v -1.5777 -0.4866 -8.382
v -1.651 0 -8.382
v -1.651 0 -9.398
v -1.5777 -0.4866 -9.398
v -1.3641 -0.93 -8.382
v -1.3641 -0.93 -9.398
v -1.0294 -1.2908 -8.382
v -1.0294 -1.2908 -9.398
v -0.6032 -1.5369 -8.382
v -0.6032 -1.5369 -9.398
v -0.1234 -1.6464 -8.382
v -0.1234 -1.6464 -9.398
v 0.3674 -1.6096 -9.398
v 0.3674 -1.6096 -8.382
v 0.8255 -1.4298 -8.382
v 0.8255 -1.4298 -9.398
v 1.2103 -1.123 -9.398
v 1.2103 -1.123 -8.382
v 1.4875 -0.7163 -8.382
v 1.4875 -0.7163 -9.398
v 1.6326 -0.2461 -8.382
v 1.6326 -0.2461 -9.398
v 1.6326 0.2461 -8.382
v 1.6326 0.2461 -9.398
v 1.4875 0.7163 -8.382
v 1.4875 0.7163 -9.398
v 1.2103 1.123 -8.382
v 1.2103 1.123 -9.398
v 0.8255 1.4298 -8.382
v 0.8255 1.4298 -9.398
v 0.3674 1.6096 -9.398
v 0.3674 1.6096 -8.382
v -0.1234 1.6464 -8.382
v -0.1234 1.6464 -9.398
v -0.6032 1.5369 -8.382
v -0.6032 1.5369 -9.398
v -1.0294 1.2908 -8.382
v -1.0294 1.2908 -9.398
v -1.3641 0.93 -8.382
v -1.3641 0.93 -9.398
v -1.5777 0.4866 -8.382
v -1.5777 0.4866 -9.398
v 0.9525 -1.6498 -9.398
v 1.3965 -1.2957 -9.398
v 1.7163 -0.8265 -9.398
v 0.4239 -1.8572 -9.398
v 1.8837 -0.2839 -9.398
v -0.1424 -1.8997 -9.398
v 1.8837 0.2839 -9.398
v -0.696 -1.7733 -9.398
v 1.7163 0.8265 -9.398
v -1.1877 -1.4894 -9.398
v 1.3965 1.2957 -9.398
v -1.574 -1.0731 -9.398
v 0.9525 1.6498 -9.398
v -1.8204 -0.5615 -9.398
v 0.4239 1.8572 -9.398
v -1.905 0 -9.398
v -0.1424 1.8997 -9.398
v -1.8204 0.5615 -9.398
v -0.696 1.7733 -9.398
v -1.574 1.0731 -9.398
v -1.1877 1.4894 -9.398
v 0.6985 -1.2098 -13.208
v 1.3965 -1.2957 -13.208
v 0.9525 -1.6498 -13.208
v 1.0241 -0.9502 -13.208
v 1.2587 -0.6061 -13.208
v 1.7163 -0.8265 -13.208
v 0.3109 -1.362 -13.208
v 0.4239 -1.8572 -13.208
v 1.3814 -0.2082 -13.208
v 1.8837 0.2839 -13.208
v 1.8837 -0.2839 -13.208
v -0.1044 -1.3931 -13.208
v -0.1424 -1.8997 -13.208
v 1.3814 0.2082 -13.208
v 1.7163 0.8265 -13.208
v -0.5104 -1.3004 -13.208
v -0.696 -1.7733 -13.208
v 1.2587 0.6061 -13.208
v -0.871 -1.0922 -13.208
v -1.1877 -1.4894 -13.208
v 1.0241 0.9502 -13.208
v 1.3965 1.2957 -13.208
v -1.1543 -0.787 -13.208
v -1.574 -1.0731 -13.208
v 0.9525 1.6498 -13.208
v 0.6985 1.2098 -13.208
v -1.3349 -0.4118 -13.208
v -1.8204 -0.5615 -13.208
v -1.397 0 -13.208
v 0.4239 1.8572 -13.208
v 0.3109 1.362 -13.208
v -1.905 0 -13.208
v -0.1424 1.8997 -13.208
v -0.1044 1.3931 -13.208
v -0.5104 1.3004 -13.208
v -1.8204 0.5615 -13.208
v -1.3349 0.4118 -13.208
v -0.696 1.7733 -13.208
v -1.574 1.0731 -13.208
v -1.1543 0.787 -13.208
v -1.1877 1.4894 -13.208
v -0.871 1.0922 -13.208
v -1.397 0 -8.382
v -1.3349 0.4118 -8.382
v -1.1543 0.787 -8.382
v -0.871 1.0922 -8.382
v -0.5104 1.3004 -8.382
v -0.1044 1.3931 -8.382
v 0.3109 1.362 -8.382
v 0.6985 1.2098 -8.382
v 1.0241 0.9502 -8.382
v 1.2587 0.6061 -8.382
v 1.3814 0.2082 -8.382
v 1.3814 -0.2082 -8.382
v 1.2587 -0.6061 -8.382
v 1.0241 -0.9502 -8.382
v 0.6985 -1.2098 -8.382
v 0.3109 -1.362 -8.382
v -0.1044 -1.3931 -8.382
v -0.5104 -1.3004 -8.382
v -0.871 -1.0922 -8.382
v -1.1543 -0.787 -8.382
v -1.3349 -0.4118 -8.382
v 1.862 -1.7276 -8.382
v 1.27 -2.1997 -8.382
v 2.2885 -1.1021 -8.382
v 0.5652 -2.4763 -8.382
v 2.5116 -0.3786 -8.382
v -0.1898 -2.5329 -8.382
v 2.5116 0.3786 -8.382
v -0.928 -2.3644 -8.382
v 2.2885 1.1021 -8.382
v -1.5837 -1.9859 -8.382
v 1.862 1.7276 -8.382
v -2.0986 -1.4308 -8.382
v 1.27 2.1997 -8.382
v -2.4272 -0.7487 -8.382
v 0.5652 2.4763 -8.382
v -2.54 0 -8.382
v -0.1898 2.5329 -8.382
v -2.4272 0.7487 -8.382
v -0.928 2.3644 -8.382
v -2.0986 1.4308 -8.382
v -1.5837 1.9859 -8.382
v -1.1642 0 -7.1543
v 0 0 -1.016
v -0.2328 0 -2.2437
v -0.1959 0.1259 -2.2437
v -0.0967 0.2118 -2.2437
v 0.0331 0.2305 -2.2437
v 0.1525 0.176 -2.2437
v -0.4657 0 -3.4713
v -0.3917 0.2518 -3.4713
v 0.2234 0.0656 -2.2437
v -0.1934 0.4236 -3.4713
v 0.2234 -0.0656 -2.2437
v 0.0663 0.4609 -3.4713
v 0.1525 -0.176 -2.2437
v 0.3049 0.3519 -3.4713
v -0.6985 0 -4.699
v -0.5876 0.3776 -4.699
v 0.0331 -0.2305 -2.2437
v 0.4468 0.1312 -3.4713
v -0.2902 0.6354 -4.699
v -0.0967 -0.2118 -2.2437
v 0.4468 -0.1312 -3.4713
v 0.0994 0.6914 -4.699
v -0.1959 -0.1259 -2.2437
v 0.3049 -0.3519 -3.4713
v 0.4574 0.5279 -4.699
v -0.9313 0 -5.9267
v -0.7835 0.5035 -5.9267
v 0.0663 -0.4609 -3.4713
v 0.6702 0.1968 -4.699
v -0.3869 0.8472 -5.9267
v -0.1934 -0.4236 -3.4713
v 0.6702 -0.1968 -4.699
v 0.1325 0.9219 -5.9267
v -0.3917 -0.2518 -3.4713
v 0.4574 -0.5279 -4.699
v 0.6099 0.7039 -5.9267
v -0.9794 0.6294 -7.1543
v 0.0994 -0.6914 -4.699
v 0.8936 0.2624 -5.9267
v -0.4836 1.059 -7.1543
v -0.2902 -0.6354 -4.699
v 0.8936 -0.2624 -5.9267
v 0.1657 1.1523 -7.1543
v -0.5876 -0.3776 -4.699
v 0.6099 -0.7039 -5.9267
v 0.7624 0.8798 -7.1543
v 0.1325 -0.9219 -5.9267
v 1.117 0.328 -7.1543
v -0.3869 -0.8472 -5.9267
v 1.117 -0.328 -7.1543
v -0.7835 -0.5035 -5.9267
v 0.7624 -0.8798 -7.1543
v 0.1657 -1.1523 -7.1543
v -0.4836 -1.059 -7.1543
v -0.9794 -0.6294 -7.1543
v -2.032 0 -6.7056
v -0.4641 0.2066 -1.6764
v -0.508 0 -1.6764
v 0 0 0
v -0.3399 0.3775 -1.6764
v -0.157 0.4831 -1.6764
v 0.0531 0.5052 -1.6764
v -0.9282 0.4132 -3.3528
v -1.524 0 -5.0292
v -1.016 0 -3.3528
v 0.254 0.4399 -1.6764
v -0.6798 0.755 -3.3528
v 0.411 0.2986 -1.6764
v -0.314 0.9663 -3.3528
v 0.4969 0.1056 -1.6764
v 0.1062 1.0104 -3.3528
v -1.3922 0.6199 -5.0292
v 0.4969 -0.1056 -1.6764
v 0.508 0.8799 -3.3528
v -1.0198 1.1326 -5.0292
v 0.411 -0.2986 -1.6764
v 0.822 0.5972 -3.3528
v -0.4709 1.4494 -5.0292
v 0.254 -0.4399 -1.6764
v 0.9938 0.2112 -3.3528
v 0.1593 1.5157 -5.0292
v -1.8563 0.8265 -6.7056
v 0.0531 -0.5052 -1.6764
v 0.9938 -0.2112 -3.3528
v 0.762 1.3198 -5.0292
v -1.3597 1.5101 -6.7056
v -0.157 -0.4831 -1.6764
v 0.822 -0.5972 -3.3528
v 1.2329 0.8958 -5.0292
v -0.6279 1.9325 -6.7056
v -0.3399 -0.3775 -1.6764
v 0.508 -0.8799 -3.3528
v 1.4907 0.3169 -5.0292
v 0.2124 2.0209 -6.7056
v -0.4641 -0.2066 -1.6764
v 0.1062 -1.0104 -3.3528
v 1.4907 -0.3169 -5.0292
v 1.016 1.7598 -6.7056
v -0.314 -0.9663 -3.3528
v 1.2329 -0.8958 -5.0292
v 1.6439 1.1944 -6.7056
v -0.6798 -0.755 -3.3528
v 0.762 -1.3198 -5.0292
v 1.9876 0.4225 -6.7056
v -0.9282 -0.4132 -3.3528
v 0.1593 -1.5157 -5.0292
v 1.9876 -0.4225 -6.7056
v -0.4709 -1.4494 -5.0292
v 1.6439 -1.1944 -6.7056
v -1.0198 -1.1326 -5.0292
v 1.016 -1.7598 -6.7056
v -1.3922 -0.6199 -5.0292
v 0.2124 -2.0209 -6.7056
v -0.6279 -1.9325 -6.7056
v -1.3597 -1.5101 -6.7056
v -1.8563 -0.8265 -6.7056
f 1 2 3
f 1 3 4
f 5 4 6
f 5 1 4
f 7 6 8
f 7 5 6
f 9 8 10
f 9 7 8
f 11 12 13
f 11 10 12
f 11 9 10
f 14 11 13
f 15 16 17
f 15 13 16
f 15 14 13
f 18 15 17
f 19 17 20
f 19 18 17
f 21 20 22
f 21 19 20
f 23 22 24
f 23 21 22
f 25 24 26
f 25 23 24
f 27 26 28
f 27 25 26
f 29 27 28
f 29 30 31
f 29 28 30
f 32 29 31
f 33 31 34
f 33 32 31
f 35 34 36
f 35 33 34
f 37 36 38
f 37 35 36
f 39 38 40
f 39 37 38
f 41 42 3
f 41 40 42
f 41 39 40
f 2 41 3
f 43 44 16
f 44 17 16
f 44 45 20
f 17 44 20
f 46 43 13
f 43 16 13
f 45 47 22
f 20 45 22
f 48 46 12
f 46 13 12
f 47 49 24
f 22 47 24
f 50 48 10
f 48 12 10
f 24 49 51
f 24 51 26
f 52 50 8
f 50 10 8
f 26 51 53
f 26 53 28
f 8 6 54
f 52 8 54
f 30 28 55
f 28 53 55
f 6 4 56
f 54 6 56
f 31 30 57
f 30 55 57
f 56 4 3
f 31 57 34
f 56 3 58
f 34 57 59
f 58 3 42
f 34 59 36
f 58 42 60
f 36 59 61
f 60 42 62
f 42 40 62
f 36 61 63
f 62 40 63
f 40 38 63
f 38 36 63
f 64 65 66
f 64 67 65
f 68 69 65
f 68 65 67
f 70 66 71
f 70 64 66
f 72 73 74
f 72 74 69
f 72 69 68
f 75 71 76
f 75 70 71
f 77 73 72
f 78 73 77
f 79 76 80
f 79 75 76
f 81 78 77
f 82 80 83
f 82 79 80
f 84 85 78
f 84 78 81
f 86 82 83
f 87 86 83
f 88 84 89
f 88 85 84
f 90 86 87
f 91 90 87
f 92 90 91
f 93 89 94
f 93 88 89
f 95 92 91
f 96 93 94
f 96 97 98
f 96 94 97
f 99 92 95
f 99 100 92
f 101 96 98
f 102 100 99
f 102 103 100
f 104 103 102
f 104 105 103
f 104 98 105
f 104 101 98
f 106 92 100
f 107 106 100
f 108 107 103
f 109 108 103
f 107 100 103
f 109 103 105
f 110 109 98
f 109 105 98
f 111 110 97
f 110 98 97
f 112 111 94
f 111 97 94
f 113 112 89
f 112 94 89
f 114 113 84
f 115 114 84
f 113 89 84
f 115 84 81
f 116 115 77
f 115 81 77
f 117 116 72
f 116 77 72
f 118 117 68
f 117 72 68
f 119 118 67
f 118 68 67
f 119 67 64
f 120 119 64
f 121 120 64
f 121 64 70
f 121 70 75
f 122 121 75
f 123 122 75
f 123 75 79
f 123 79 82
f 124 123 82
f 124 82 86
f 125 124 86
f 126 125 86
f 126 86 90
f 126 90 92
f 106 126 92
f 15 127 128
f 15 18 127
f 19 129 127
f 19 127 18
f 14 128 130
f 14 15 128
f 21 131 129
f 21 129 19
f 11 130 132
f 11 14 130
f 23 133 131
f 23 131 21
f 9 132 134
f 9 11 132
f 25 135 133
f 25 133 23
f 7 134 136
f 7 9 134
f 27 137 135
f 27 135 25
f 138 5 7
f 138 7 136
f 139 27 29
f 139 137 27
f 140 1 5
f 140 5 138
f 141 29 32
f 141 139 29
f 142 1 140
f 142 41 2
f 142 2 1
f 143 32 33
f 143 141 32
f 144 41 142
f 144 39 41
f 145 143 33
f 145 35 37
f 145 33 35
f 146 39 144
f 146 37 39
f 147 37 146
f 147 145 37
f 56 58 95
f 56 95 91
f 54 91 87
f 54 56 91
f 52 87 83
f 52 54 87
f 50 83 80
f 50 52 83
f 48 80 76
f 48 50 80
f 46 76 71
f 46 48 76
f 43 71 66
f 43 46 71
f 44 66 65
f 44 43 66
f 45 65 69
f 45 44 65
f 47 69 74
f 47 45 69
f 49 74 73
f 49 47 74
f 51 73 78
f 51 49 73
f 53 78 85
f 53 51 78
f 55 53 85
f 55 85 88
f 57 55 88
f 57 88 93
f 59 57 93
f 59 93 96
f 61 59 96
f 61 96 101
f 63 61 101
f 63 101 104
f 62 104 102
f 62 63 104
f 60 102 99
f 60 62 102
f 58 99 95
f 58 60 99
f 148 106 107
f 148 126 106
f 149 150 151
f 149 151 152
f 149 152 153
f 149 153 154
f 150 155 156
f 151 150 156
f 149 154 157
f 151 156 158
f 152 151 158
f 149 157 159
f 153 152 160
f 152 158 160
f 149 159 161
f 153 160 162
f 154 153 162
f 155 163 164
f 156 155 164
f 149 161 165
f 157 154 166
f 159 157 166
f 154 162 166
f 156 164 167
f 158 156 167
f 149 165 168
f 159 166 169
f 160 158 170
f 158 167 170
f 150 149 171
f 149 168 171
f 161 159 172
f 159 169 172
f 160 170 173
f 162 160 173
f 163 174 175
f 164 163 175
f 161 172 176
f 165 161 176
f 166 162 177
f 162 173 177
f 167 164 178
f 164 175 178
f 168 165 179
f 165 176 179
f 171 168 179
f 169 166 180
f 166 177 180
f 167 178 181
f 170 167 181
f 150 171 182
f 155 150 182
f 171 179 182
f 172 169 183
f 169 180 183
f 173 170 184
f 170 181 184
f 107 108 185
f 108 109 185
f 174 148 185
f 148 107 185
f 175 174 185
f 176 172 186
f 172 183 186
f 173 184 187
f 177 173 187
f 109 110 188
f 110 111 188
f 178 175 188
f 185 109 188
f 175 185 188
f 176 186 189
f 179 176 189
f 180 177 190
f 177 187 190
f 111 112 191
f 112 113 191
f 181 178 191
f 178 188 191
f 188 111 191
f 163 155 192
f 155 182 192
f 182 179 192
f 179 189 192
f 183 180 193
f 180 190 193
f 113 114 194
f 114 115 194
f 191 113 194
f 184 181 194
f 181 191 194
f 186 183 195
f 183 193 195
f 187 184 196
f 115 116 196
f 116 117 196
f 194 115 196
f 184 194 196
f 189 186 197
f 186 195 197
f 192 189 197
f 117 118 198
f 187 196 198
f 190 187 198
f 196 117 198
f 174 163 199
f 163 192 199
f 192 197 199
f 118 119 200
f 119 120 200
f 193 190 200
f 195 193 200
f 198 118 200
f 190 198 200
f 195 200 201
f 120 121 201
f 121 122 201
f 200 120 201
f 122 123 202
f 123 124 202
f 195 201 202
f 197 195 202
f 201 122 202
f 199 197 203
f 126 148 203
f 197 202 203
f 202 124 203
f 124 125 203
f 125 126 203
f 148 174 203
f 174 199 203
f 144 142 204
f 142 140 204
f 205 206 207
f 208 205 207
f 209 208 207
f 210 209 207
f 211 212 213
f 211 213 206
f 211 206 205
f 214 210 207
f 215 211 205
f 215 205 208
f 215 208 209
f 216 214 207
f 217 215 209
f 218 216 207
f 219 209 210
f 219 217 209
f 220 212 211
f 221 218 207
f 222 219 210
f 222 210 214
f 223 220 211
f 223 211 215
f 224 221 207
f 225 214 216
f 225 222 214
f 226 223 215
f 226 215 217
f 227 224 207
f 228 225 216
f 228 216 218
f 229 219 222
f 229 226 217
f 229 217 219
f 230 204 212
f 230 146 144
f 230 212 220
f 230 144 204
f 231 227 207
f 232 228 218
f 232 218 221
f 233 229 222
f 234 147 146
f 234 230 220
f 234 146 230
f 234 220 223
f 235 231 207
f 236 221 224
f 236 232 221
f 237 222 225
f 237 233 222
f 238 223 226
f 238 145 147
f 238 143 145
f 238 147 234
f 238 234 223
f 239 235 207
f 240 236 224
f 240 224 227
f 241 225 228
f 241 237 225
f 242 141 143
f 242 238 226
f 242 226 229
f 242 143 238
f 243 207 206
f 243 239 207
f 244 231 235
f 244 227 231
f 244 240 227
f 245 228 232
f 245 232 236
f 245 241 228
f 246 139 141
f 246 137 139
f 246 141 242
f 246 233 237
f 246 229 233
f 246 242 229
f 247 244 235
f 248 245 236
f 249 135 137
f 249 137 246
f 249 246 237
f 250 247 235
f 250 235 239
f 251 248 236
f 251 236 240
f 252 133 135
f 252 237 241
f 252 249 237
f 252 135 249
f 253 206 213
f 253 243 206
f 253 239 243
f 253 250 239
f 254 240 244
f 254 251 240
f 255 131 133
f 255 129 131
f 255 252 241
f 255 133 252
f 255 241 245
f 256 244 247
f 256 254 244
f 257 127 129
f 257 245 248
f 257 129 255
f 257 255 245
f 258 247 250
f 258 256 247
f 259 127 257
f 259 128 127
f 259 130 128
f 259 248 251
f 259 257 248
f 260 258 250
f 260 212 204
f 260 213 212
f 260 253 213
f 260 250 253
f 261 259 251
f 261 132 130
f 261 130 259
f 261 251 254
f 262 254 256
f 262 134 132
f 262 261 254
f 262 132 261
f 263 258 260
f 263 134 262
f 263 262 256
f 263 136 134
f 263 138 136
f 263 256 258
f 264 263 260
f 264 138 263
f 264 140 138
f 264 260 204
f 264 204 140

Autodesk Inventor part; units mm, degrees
ref_plane "YZ Plane" through (0, 0, 0) normal (1, 0, 0) x (0, 1, 0)
ref_plane "XZ Plane" through (0, 0, 0) normal (0, 1, 0) x (-1, 0, 0)
ref_plane "XY Plane" through (0, 0, 0) normal (0, 0, 1) x (1, 0, 0)
sketch "Sketch1" plane through (0, 0, 0) normal (0, 1, 0) x (-1, 0, 0)
  line L0 (0, 0) -> (0, -8.382)
  line L1 (0, -8.382) -> (0, -9.398)
  line L2 (0, -9.398) -> (0, -13.208)
  line L3 (0, -8.382) -> (2.54, -8.382)
  line L4 (2.54, -8.382) -> (0, 0)
  line L5 (0, -9.398) -> (1.651, -9.398)
  line L6 (1.651, -9.398) -> (1.651, -8.382)
  line L7 (0, -13.208) -> (1.905, -13.208)
  line L8 (1.905, -13.208) -> (1.905, -9.398)
  line L9 (1.905, -9.398) -> (1.651, -9.398)
  line L10 (0, 0) -> (0, -1.016)
  line L11 (1.651, -8.382) -> (1.397, -8.382)
  line L12 (0, -1.016) -> (1.397, -8.382)
  line L13 (1.397, -8.382) -> (1.397, -13.208)
  dimension "d0" = 8.382
  dimension "d1" = 1.016
  dimension "d2" = 3.81
  dimension "d3" = 2.54
  dimension "d4" = 1.651
  dimension "d5" = 1.905
  dimension "d6" = 1.016
  dimension "d7" = 0.254
revolve "Revolution1" add sketch "Sketch1" angle 360 about axis through (0, 0, 0) along (0, 0, -1) contours L4 L3 L12 L0 | L3 L6 L5 L13 | L5 L9 L8 L7 L13
properties part number "Pencil Tip"
